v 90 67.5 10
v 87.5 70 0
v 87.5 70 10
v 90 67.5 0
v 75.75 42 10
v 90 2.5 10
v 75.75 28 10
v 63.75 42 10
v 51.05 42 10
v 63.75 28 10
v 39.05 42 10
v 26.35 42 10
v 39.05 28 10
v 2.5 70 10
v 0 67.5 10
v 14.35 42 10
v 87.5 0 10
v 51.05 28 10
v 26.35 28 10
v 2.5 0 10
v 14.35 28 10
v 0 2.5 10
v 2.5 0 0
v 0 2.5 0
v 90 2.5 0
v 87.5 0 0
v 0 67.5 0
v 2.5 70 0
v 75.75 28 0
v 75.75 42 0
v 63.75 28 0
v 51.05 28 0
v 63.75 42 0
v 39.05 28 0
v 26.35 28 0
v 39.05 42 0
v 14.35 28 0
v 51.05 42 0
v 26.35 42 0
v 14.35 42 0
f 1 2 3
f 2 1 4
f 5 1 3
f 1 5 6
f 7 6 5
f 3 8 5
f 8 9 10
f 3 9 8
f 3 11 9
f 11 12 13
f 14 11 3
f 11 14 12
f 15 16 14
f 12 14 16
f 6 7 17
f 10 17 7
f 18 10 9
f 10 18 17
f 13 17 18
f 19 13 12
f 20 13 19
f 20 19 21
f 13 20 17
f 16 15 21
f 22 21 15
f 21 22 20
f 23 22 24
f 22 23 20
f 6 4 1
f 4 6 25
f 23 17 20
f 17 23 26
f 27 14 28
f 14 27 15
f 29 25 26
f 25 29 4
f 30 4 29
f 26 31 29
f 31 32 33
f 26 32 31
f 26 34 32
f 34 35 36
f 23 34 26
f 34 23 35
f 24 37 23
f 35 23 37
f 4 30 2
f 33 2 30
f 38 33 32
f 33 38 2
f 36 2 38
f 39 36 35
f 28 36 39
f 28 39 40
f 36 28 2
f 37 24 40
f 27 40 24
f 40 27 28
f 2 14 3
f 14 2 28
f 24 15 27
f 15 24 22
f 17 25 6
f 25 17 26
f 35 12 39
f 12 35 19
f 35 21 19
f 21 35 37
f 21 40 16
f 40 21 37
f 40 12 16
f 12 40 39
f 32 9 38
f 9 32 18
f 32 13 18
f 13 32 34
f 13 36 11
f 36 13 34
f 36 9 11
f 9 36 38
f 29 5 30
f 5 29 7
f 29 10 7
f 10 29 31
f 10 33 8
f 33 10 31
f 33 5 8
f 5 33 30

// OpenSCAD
$fn = 32;

// ----------------------------------------------------------------------
// Windowed plate: 3 voids, 90 x 70 x 10 mm
// ----------------------------------------------------------------------

// --- parameters (mm) ---
plate_l = 90;             // plate length, X
plate_w = 70;             // plate width, Y
plate_t = 10;             // plate thickness, Z
edge_margin = 8;          // wall from the plate edge to any window
windows = 3;              // number of windows in the row
win_l = 12;               // window length
win_w = 14;               // window width
win_pitch = 24.7;         // window pitch along X
depth_1 = 10;             // depth of void 1 (full thickness = through)
depth_2 = 10;             // depth of void 2 (full thickness = through)
depth_3 = 10;             // depth of void 3 (full thickness = through)
corner_c = 2.5;           // corner chamfer of the plate

profile = [[2.5, 0], [87.5, 0], [90, 2.5], [90, 67.5], [87.5, 70], [2.5, 70], [0, 67.5], [0, 2.5]];  // primary outline, 8 points, counter clockwise
void_1 = [[14.35, 28], [26.35, 28], [26.35, 42], [14.35, 42]];  // window 1 of the row, 4 points
void_2 = [[39.05, 28], [51.05, 28], [51.05, 42], [39.05, 42]];  // window 2 of the row, 4 points
void_3 = [[63.75, 28], [75.75, 28], [75.75, 42], [63.75, 42]];  // window 3 of the row, 4 points

// --- the one profile operation ---
difference() {
  linear_extrude(height = plate_t) polygon(points = profile);
  translate([0, 0, -1])
    linear_extrude(height = plate_t + 2) polygon(points = void_1);
  translate([0, 0, -1])
    linear_extrude(height = plate_t + 2) polygon(points = void_2);
  translate([0, 0, -1])
    linear_extrude(height = plate_t + 2) polygon(points = void_3);
}
